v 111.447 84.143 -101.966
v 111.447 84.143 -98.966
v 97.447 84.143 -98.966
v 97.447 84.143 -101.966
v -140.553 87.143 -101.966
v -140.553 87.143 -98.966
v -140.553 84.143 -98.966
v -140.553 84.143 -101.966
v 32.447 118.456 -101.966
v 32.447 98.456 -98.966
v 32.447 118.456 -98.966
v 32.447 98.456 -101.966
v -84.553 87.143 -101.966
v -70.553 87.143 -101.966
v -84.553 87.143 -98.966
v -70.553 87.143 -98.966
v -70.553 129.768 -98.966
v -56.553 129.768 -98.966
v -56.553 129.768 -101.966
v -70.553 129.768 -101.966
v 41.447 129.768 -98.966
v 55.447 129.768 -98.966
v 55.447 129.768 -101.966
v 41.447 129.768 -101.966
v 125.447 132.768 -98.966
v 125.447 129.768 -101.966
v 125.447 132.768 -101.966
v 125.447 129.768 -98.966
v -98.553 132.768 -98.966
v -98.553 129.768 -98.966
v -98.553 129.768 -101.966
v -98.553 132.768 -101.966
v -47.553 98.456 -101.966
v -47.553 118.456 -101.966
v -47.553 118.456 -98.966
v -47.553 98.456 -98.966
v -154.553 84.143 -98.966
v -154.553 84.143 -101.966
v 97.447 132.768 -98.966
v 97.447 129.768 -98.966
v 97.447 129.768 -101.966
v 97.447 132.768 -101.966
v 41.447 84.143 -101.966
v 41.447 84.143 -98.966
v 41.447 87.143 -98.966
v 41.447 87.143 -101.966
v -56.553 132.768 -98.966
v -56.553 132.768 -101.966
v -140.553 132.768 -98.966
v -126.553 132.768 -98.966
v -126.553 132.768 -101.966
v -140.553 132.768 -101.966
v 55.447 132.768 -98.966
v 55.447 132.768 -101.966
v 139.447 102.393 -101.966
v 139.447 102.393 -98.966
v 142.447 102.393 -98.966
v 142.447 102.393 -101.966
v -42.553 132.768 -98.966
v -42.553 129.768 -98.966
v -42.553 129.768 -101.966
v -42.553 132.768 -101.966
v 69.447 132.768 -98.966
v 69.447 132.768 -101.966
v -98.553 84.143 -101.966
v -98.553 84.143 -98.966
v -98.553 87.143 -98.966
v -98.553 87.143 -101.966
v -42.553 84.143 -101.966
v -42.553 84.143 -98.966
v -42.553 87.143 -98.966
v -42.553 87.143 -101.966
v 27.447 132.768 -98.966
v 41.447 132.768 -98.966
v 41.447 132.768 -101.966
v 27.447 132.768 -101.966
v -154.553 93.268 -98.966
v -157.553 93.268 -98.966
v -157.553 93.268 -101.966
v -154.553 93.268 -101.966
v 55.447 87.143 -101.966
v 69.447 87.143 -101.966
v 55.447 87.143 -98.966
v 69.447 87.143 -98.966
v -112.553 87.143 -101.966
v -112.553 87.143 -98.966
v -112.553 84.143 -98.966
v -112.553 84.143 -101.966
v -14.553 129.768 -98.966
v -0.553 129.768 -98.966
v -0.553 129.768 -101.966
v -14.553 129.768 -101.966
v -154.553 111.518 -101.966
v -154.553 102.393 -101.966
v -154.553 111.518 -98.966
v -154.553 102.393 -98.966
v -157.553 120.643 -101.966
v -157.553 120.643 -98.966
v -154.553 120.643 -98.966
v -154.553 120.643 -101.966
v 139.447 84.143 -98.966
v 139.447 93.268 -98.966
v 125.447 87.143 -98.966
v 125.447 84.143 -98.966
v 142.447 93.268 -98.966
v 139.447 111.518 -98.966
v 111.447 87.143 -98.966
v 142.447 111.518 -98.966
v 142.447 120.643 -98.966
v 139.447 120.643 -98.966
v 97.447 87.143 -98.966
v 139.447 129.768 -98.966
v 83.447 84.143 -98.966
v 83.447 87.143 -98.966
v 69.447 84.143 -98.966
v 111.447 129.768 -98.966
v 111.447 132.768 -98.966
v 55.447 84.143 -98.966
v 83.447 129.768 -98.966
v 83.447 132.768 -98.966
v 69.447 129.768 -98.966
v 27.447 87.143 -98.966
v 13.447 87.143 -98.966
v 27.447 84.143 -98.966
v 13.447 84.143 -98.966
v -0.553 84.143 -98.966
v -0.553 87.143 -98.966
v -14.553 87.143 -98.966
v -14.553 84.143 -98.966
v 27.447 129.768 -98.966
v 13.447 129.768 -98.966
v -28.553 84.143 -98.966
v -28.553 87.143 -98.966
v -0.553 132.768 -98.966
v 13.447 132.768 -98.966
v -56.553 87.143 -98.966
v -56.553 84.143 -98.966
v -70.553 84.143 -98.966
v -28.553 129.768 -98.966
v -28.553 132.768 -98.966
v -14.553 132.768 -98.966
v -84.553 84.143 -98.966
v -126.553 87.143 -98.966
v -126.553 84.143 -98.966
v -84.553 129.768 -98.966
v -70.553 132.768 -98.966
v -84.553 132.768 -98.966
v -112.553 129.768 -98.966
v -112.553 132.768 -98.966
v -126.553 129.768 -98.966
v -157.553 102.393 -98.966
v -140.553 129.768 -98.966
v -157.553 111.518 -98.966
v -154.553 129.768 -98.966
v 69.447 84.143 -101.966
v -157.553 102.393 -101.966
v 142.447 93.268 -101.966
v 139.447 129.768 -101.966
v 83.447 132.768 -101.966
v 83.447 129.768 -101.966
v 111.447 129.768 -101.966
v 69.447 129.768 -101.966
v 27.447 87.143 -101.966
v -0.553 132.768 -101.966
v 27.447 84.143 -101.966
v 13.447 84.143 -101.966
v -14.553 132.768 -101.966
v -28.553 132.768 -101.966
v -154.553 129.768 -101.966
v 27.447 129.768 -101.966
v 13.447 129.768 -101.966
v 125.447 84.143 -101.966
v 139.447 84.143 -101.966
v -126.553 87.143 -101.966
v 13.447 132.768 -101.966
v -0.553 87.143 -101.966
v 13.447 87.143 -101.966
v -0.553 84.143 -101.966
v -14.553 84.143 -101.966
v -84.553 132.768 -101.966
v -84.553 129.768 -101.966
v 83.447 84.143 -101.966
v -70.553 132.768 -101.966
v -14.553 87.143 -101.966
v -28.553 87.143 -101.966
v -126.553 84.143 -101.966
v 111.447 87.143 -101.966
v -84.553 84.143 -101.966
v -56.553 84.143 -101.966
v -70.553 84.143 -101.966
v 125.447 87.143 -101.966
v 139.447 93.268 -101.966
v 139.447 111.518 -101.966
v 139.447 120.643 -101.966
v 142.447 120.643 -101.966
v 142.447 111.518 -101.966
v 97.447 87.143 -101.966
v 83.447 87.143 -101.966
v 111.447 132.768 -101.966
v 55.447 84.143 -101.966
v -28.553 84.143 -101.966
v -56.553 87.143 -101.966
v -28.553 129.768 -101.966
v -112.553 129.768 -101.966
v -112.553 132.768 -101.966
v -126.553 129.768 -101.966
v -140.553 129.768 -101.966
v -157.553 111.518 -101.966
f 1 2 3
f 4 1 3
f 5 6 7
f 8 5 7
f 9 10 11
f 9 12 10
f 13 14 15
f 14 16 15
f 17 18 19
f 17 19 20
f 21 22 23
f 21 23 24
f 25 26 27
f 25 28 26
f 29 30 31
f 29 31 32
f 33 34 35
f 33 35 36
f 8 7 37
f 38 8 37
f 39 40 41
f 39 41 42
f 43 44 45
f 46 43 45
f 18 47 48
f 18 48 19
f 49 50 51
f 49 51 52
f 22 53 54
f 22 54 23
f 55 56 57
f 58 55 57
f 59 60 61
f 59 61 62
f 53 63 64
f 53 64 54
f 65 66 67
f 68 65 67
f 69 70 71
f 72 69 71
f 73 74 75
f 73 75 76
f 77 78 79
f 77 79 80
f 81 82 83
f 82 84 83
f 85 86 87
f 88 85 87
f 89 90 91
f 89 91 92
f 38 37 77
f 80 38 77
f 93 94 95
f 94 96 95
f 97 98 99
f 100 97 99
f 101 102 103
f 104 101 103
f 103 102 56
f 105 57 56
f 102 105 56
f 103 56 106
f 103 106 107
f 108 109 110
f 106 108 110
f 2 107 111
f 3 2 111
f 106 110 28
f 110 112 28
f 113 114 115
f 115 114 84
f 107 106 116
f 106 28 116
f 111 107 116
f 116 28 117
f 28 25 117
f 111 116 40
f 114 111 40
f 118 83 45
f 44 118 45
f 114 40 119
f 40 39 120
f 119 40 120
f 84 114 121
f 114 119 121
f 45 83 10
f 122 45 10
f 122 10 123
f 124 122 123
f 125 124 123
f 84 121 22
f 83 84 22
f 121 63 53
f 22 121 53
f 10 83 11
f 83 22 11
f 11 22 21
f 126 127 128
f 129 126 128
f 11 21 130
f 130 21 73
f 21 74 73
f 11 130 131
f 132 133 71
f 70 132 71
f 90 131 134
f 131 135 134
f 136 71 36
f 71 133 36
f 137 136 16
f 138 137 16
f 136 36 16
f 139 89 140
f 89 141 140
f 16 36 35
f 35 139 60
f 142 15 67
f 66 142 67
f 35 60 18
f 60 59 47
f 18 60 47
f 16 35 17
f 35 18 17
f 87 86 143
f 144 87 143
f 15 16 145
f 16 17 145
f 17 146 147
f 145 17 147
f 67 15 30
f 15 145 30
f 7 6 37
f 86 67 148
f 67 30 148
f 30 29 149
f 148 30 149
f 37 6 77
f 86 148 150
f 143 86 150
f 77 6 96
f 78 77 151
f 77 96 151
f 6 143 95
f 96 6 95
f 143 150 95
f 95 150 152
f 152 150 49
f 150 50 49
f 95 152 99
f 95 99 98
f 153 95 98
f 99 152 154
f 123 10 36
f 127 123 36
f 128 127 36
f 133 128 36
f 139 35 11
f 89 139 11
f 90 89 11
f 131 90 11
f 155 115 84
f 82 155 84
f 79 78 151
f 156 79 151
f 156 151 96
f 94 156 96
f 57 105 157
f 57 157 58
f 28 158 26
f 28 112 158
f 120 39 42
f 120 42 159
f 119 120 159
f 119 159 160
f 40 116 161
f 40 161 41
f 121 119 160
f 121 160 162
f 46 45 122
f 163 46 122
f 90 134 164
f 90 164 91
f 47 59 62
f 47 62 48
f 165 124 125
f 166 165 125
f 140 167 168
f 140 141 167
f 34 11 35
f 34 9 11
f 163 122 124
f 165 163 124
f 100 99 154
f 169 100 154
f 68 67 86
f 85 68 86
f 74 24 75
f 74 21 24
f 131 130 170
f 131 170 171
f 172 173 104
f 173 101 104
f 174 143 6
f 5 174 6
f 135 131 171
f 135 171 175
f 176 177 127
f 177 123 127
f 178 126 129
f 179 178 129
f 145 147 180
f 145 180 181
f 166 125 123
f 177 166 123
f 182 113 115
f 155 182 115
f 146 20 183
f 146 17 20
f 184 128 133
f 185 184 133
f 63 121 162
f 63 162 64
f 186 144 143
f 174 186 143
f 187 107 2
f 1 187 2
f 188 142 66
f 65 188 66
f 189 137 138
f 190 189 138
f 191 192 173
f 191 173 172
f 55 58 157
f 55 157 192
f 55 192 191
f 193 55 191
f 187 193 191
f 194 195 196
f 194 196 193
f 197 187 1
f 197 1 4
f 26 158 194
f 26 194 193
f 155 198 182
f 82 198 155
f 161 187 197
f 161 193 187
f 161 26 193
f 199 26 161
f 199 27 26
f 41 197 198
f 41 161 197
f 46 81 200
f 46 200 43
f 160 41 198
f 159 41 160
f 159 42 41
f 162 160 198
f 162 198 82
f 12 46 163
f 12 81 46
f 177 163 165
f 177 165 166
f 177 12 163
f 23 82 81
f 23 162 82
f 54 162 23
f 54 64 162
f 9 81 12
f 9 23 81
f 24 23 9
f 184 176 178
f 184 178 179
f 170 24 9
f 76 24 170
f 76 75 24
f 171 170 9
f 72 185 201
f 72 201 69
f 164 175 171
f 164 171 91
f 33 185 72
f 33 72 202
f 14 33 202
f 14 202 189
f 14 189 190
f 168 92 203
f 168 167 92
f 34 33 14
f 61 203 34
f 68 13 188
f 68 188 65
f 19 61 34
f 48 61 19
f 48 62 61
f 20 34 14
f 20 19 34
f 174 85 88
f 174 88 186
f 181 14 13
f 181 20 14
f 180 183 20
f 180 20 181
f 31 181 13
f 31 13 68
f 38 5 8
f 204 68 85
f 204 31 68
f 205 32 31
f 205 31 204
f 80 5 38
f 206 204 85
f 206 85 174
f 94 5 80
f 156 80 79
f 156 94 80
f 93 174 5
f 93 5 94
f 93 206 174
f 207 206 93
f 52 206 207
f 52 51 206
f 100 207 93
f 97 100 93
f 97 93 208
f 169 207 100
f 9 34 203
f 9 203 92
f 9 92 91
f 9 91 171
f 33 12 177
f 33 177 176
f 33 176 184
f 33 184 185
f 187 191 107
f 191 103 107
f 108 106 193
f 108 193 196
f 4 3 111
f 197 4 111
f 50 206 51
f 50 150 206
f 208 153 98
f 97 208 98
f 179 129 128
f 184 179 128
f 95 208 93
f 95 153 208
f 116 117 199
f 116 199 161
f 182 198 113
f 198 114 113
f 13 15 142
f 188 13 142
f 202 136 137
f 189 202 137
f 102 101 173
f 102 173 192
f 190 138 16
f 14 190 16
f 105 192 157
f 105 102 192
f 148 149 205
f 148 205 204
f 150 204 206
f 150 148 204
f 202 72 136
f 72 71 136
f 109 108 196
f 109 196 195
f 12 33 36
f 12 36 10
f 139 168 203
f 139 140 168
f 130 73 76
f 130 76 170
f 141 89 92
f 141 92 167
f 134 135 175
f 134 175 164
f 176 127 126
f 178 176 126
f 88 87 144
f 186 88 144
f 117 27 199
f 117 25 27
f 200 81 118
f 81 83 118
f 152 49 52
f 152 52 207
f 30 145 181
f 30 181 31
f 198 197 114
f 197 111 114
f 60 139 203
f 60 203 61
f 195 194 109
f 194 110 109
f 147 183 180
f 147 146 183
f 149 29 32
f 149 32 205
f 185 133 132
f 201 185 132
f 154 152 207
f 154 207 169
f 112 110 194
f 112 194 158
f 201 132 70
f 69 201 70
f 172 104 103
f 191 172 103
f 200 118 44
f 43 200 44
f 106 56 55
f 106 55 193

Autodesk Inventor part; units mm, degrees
ref_plane "YZ Plane" through (0, 0, 0) normal (1, 0, 0) x (0, 1, 0)
ref_plane "XZ Plane" through (0, 0, 0) normal (0, 1, 0) x (-1, 0, 0)
ref_plane "XY Plane" through (0, 0, 0) normal (0, 0, 1) x (1, 0, 0)
ref_plane "Work Plane1" through (139.4467, 111.518, -98.9659) normal (0, 0, -1) x (-1, 0, 0)
sketch "Sketch1" plane through (139.4467, 111.518, -98.9659) normal (0, 0, -1) x (-1, 0, 0)
  line L0 (0, 9.125) -> (0, 18.25) projected
  line L1 (0, -9.125) -> (0, 0) projected
  line L2 (-3, -18.25) -> (-3, -9.125) projected
  line L3 (-3, 0) -> (-3, 9.125) projected
  line L4 (0, 0) -> (-3, 0) projected
  line L5 (0, -9.125) -> (-3, -9.125) projected
  line L6 (0, -18.25) -> (-3, -18.25) projected
  line L7 (0, -27.375) -> (0, -18.25) projected
  line L8 (0, 9.125) -> (-3, 9.125) projected
  line L9 (294, 9.125) -> (294, 18.25) projected
  line L10 (297, 0) -> (297, 9.125) projected
  line L11 (294, -9.125) -> (294, 0) projected
  line L12 (297, -18.25) -> (297, -9.125) projected
  line L13 (294, -27.375) -> (294, -18.25) projected
  line L14 (297, -18.25) -> (294, -18.25) projected
  line L15 (297, -9.125) -> (294, -9.125) projected
  line L16 (297, 0) -> (294, 0) projected
  line L17 (297, 9.125) -> (294, 9.125) projected
  line L18 (0, -27.375) -> (14, -27.375)
  line L19 (14, -27.375) -> (14, -24.375)
  line L20 (14, -24.375) -> (28, -24.375)
  line L21 (28, -24.375) -> (28, -27.375)
  line L22 (56, -24.375) -> (56, -27.375)
  line L23 (42, -24.375) -> (56, -24.375)
  line L24 (42, -27.375) -> (42, -24.375)
  line L25 (28, -27.375) -> (42, -27.375)
  line L26 (84, -24.375) -> (84, -27.375)
  line L27 (70, -24.375) -> (84, -24.375)
  line L28 (70, -27.375) -> (70, -24.375)
  line L29 (56, -27.375) -> (70, -27.375)
  line L30 (112, -24.375) -> (112, -27.375)
  line L31 (98, -24.375) -> (112, -24.375)
  line L32 (98, -27.375) -> (98, -24.375)
  line L33 (84, -27.375) -> (98, -27.375)
  line L34 (140, -24.375) -> (140, -27.375)
  line L35 (126, -24.375) -> (140, -24.375)
  line L36 (126, -27.375) -> (126, -24.375)
  line L37 (112, -27.375) -> (126, -27.375)
  line L38 (168, -24.375) -> (168, -27.375)
  line L39 (154, -24.375) -> (168, -24.375)
  line L40 (154, -27.375) -> (154, -24.375)
  line L41 (140, -27.375) -> (154, -27.375)
  line L42 (196, -24.375) -> (196, -27.375)
  line L43 (182, -24.375) -> (196, -24.375)
  line L44 (182, -27.375) -> (182, -24.375)
  line L45 (168, -27.375) -> (182, -27.375)
  line L46 (224, -24.375) -> (224, -27.375)
  line L47 (210, -24.375) -> (224, -24.375)
  line L48 (210, -27.375) -> (210, -24.375)
  line L49 (196, -27.375) -> (210, -27.375)
  line L50 (252, -24.375) -> (252, -27.375)
  line L51 (238, -24.375) -> (252, -24.375)
  line L52 (238, -27.375) -> (238, -24.375)
  line L53 (224, -27.375) -> (238, -27.375)
  line L54 (280, -24.375) -> (280, -27.375)
  line L55 (266, -24.375) -> (280, -24.375)
  line L56 (266, -27.375) -> (266, -24.375)
  line L57 (252, -27.375) -> (266, -27.375)
  line L58 (280, -27.375) -> (294, -27.375)
  line L59 (0, 18.25) -> (14, 18.25)
  line L60 (14, 18.25) -> (14, 21.25)
  line L61 (14, 21.25) -> (28, 21.25)
  line L62 (28, 21.25) -> (28, 18.25)
  line L63 (56, 21.25) -> (56, 18.25)
  line L64 (42, 21.25) -> (56, 21.25)
  line L65 (42, 18.25) -> (42, 21.25)
  line L66 (28, 18.25) -> (42, 18.25)
  line L67 (84, 21.25) -> (84, 18.25)
  line L68 (70, 21.25) -> (84, 21.25)
  line L69 (70, 18.25) -> (70, 21.25)
  line L70 (56, 18.25) -> (70, 18.25)
  line L71 (112, 21.25) -> (112, 18.25)
  line L72 (98, 21.25) -> (112, 21.25)
  line L73 (98, 18.25) -> (98, 21.25)
  line L74 (84, 18.25) -> (98, 18.25)
  line L75 (140, 21.25) -> (140, 18.25)
  line L76 (126, 21.25) -> (140, 21.25)
  line L77 (126, 18.25) -> (126, 21.25)
  line L78 (112, 18.25) -> (126, 18.25)
  line L79 (168, 21.25) -> (168, 18.25)
  line L80 (154, 21.25) -> (168, 21.25)
  line L81 (154, 18.25) -> (154, 21.25)
  line L82 (140, 18.25) -> (154, 18.25)
  line L83 (196, 21.25) -> (196, 18.25)
  line L84 (182, 21.25) -> (196, 21.25)
  line L85 (182, 18.25) -> (182, 21.25)
  line L86 (168, 18.25) -> (182, 18.25)
  line L87 (224, 21.25) -> (224, 18.25)
  line L88 (210, 21.25) -> (224, 21.25)
  line L89 (210, 18.25) -> (210, 21.25)
  line L90 (196, 18.25) -> (210, 18.25)
  line L91 (252, 21.25) -> (252, 18.25)
  line L92 (238, 21.25) -> (252, 21.25)
  line L93 (238, 18.25) -> (238, 21.25)
  line L94 (224, 18.25) -> (238, 18.25)
  line L95 (280, 21.25) -> (280, 18.25)
  line L96 (266, 21.25) -> (280, 21.25)
  line L97 (266, 18.25) -> (266, 21.25)
  line L98 (252, 18.25) -> (266, 18.25)
  line L99 (280, 18.25) -> (294, 18.25)
  point P0 (139.4467, -111.518)
  point P1 (28, -27.375)
  point P2 (56, -27.375)
  point P3 (168, -27.375)
  point P4 (224, -27.375)
  point P5 (252, 18.25)
  point P6 (224, 18.25)
  point P7 (196, 18.25)
  point P8 (168, 18.25)
  point P9 (140, 18.25)
  point P10 (112, 18.25)
  point P11 (84, 18.25)
  point P12 (56, 18.25)
  point P13 (28, 18.25)
  point P14 (0, 18.25)
  dimension "d0" = 3
  dimension "d1" = 14
  dimension "d4" = 28
  dimension "d13" = 3
  dimension "d14" = 14
  dimension "d15" = 28
extrude "Extrusion1" add sketch "Sketch1" along normal blind 3
sketch "Sketch2" plane through (139.4467, 111.518, -101.9659) normal (0, 0, -1) x (-1, 0, 0)
  line L0 (107, 6.9375) -> (187, 6.9375)
  line L1 (187, 6.9375) -> (187, -13.0625)
  line L2 (187, -13.0625) -> (107, -13.0625)
  line L3 (107, -13.0625) -> (107, 6.9375)
  line L4 (187, -3.0625) -> (294, -3.0625) construction
  line L5 (294, -9.125) -> (294, 0) projected
  line L6 (107, -3.0625) -> (0, -3.0625) construction
  line L7 (0, 0) -> (0, -9.125) projected
  line L8 (147, -13.0625) -> (147, -24.375) construction
  line L9 (154, -24.375) -> (168, -24.375) projected
  line L10 (147, 6.9375) -> (147, 18.25) construction
  line L11 (154, 18.25) -> (140, 18.25) projected
  point P0 (139.4467, -111.518)
  dimension "d19" = 80
  dimension "d20" = 20
extrude "Extrusion2" cut sketch "Sketch2" against normal blind 3
properties part number "BackWall"
